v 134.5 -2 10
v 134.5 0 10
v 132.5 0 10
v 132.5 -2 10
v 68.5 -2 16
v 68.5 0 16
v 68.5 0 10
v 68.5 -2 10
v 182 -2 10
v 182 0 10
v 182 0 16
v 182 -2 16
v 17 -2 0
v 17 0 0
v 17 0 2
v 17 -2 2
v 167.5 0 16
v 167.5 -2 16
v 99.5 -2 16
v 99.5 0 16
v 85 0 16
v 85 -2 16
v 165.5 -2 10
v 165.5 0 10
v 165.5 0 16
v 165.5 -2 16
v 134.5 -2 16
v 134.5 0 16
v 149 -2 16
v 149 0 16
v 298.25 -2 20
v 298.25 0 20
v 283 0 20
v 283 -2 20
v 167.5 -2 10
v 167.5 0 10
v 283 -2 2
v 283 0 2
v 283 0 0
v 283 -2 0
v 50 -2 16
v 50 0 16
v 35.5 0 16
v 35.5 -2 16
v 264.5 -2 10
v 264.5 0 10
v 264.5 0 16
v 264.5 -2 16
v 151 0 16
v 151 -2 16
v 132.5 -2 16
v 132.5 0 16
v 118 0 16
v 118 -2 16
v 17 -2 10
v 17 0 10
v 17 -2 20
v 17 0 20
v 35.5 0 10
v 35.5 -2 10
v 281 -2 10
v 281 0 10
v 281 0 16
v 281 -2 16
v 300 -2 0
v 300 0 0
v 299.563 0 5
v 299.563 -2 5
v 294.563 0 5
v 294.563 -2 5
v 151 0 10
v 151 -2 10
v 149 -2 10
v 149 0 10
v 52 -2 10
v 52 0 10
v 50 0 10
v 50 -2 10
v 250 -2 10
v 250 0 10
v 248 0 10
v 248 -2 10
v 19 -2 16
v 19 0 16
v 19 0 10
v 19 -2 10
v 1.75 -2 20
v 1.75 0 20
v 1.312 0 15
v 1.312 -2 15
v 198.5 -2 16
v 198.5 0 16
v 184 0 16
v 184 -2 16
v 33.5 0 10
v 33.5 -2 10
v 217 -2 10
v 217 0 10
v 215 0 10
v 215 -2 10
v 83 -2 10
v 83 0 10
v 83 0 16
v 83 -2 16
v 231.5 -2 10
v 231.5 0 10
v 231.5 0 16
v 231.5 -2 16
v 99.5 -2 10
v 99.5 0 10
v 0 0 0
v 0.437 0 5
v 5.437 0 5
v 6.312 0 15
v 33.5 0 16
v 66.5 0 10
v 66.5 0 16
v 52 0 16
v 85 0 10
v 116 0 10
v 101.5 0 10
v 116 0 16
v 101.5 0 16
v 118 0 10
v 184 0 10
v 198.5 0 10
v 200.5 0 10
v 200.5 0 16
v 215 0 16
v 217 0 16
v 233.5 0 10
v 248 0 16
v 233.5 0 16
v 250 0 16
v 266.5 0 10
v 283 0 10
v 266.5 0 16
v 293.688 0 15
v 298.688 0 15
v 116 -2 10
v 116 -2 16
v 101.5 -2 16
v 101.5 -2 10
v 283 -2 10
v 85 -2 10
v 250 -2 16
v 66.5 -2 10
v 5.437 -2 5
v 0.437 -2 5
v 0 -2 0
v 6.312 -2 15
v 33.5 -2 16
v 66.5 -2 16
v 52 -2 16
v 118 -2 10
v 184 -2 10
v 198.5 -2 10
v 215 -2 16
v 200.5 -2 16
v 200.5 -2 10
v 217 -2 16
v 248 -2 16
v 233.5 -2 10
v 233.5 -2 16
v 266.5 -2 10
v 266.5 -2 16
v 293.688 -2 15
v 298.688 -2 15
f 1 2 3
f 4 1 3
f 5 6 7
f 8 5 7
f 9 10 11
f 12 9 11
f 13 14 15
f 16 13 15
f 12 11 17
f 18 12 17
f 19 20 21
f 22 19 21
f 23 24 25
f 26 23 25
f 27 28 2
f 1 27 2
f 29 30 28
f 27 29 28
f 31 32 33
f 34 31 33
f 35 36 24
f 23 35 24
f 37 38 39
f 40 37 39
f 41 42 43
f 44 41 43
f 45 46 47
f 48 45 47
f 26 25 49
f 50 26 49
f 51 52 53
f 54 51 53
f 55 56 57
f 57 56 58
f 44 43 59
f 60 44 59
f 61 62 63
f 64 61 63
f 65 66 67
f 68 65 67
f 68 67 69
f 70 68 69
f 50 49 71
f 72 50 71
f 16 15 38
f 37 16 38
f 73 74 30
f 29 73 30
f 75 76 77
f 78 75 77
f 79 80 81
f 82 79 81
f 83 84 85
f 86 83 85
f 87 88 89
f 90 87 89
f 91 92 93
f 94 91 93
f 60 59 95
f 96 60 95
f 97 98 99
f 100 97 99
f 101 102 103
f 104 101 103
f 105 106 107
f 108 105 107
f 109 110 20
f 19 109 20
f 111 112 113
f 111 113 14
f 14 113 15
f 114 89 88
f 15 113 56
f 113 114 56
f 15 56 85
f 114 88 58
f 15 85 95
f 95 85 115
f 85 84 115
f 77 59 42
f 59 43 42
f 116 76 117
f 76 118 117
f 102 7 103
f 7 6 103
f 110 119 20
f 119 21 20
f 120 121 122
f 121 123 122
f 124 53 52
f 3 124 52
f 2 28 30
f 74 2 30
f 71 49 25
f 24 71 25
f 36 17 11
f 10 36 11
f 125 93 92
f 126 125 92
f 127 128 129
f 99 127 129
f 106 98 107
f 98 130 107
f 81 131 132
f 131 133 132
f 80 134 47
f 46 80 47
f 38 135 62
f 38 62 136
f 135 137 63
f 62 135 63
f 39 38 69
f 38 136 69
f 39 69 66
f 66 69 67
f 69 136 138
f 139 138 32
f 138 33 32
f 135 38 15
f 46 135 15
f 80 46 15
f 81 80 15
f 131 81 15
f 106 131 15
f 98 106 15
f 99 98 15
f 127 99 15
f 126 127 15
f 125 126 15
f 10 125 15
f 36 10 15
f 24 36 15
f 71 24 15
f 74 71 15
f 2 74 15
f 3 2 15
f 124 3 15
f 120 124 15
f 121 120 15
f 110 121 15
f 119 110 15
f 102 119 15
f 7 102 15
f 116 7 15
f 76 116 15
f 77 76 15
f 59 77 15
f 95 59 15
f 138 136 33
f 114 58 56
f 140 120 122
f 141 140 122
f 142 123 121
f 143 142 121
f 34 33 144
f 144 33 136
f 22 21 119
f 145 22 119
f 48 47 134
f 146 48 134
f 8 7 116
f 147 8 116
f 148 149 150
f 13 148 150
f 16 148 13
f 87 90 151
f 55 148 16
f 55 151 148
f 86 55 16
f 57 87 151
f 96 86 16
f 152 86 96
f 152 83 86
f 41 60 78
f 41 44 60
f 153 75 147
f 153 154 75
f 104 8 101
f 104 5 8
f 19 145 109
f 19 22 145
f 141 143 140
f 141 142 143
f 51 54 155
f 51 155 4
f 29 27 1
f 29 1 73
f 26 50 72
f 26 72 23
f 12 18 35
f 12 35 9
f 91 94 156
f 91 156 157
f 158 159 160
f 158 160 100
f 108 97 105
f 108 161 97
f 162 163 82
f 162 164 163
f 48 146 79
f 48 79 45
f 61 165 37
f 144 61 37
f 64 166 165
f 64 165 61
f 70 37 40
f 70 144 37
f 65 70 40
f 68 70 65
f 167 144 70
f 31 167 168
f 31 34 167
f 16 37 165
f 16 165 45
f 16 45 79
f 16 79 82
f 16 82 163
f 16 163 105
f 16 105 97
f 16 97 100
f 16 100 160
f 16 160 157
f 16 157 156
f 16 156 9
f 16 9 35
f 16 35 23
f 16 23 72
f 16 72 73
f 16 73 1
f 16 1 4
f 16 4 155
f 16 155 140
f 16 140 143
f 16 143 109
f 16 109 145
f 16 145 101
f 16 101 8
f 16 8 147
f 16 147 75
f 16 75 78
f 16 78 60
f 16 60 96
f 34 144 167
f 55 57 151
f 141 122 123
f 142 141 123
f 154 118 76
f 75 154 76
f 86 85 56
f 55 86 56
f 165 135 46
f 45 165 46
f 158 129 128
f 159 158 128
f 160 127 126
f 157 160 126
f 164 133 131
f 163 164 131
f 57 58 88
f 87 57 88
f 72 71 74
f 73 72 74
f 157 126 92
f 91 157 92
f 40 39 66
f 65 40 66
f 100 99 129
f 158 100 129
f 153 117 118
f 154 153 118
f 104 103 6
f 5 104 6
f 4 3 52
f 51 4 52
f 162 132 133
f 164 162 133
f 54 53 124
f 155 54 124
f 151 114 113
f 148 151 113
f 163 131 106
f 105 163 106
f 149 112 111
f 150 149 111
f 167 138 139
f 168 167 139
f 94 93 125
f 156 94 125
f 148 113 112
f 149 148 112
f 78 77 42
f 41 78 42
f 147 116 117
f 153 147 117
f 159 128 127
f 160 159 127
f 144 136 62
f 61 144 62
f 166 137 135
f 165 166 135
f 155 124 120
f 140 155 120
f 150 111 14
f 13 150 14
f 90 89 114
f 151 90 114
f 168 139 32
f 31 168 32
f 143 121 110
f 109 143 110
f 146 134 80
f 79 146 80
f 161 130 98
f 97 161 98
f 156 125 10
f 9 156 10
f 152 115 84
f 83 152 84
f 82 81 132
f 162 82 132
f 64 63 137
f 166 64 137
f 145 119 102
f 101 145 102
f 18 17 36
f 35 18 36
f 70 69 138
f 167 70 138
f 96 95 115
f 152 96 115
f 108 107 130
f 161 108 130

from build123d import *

# Parameters (mm, degrees)
F1_DEPTH = 2


with BuildPart() as f1:
    # F0 (on Front) → F1 (new body)
    with BuildSketch(Plane.XZ):
        Polygon((0.437443, 5), (0, 0), (17, 0), (17, 2), (283, 2), (283, 0), (300, 0), (299.562557, 5), (294.562557, 5), (293.68767, 15), (298.68767, 15), (298.250227, 20), (283, 20), (283, 10), (281, 10), (281, 16), (266.5, 16), (266.5, 10), (264.5, 10), (264.5, 16), (250, 16), (250, 10), (248, 10), (248, 16), (233.5, 16), (233.5, 10), (231.5, 10), (231.5, 16), (217, 16), (217, 10), (215, 10), (215, 16), (200.5, 16), (200.5, 10), (198.5, 10), (198.5, 16), (184, 16), (184, 10), (182, 10), (182, 16), (167.5, 16), (167.5, 10), (165.5, 10), (165.5, 16), (151, 16), (151, 10), (149, 10), (149, 16), (134.5, 16), (134.5, 10), (132.5, 10), (132.5, 16), (118, 16), (118, 10), (116, 10), (116, 16), (101.5, 16), (101.5, 10), (99.5, 10), (99.5, 16), (85, 16), (85, 10), (83, 10), (83, 16), (68.5, 16), (68.5, 10), (66.5, 10), (66.5, 16), (52, 16), (52, 10), (50, 10), (50, 16), (35.5, 16), (35.5, 10), (33.5, 10), (33.5, 16), (19, 16), (19, 10), (17, 10), (17, 20), (1.749773, 20), (1.31233, 15), (6.31233, 15), (5.437443, 5), align=None)
    extrude(amount=F1_DEPTH)


solid = f1.part
